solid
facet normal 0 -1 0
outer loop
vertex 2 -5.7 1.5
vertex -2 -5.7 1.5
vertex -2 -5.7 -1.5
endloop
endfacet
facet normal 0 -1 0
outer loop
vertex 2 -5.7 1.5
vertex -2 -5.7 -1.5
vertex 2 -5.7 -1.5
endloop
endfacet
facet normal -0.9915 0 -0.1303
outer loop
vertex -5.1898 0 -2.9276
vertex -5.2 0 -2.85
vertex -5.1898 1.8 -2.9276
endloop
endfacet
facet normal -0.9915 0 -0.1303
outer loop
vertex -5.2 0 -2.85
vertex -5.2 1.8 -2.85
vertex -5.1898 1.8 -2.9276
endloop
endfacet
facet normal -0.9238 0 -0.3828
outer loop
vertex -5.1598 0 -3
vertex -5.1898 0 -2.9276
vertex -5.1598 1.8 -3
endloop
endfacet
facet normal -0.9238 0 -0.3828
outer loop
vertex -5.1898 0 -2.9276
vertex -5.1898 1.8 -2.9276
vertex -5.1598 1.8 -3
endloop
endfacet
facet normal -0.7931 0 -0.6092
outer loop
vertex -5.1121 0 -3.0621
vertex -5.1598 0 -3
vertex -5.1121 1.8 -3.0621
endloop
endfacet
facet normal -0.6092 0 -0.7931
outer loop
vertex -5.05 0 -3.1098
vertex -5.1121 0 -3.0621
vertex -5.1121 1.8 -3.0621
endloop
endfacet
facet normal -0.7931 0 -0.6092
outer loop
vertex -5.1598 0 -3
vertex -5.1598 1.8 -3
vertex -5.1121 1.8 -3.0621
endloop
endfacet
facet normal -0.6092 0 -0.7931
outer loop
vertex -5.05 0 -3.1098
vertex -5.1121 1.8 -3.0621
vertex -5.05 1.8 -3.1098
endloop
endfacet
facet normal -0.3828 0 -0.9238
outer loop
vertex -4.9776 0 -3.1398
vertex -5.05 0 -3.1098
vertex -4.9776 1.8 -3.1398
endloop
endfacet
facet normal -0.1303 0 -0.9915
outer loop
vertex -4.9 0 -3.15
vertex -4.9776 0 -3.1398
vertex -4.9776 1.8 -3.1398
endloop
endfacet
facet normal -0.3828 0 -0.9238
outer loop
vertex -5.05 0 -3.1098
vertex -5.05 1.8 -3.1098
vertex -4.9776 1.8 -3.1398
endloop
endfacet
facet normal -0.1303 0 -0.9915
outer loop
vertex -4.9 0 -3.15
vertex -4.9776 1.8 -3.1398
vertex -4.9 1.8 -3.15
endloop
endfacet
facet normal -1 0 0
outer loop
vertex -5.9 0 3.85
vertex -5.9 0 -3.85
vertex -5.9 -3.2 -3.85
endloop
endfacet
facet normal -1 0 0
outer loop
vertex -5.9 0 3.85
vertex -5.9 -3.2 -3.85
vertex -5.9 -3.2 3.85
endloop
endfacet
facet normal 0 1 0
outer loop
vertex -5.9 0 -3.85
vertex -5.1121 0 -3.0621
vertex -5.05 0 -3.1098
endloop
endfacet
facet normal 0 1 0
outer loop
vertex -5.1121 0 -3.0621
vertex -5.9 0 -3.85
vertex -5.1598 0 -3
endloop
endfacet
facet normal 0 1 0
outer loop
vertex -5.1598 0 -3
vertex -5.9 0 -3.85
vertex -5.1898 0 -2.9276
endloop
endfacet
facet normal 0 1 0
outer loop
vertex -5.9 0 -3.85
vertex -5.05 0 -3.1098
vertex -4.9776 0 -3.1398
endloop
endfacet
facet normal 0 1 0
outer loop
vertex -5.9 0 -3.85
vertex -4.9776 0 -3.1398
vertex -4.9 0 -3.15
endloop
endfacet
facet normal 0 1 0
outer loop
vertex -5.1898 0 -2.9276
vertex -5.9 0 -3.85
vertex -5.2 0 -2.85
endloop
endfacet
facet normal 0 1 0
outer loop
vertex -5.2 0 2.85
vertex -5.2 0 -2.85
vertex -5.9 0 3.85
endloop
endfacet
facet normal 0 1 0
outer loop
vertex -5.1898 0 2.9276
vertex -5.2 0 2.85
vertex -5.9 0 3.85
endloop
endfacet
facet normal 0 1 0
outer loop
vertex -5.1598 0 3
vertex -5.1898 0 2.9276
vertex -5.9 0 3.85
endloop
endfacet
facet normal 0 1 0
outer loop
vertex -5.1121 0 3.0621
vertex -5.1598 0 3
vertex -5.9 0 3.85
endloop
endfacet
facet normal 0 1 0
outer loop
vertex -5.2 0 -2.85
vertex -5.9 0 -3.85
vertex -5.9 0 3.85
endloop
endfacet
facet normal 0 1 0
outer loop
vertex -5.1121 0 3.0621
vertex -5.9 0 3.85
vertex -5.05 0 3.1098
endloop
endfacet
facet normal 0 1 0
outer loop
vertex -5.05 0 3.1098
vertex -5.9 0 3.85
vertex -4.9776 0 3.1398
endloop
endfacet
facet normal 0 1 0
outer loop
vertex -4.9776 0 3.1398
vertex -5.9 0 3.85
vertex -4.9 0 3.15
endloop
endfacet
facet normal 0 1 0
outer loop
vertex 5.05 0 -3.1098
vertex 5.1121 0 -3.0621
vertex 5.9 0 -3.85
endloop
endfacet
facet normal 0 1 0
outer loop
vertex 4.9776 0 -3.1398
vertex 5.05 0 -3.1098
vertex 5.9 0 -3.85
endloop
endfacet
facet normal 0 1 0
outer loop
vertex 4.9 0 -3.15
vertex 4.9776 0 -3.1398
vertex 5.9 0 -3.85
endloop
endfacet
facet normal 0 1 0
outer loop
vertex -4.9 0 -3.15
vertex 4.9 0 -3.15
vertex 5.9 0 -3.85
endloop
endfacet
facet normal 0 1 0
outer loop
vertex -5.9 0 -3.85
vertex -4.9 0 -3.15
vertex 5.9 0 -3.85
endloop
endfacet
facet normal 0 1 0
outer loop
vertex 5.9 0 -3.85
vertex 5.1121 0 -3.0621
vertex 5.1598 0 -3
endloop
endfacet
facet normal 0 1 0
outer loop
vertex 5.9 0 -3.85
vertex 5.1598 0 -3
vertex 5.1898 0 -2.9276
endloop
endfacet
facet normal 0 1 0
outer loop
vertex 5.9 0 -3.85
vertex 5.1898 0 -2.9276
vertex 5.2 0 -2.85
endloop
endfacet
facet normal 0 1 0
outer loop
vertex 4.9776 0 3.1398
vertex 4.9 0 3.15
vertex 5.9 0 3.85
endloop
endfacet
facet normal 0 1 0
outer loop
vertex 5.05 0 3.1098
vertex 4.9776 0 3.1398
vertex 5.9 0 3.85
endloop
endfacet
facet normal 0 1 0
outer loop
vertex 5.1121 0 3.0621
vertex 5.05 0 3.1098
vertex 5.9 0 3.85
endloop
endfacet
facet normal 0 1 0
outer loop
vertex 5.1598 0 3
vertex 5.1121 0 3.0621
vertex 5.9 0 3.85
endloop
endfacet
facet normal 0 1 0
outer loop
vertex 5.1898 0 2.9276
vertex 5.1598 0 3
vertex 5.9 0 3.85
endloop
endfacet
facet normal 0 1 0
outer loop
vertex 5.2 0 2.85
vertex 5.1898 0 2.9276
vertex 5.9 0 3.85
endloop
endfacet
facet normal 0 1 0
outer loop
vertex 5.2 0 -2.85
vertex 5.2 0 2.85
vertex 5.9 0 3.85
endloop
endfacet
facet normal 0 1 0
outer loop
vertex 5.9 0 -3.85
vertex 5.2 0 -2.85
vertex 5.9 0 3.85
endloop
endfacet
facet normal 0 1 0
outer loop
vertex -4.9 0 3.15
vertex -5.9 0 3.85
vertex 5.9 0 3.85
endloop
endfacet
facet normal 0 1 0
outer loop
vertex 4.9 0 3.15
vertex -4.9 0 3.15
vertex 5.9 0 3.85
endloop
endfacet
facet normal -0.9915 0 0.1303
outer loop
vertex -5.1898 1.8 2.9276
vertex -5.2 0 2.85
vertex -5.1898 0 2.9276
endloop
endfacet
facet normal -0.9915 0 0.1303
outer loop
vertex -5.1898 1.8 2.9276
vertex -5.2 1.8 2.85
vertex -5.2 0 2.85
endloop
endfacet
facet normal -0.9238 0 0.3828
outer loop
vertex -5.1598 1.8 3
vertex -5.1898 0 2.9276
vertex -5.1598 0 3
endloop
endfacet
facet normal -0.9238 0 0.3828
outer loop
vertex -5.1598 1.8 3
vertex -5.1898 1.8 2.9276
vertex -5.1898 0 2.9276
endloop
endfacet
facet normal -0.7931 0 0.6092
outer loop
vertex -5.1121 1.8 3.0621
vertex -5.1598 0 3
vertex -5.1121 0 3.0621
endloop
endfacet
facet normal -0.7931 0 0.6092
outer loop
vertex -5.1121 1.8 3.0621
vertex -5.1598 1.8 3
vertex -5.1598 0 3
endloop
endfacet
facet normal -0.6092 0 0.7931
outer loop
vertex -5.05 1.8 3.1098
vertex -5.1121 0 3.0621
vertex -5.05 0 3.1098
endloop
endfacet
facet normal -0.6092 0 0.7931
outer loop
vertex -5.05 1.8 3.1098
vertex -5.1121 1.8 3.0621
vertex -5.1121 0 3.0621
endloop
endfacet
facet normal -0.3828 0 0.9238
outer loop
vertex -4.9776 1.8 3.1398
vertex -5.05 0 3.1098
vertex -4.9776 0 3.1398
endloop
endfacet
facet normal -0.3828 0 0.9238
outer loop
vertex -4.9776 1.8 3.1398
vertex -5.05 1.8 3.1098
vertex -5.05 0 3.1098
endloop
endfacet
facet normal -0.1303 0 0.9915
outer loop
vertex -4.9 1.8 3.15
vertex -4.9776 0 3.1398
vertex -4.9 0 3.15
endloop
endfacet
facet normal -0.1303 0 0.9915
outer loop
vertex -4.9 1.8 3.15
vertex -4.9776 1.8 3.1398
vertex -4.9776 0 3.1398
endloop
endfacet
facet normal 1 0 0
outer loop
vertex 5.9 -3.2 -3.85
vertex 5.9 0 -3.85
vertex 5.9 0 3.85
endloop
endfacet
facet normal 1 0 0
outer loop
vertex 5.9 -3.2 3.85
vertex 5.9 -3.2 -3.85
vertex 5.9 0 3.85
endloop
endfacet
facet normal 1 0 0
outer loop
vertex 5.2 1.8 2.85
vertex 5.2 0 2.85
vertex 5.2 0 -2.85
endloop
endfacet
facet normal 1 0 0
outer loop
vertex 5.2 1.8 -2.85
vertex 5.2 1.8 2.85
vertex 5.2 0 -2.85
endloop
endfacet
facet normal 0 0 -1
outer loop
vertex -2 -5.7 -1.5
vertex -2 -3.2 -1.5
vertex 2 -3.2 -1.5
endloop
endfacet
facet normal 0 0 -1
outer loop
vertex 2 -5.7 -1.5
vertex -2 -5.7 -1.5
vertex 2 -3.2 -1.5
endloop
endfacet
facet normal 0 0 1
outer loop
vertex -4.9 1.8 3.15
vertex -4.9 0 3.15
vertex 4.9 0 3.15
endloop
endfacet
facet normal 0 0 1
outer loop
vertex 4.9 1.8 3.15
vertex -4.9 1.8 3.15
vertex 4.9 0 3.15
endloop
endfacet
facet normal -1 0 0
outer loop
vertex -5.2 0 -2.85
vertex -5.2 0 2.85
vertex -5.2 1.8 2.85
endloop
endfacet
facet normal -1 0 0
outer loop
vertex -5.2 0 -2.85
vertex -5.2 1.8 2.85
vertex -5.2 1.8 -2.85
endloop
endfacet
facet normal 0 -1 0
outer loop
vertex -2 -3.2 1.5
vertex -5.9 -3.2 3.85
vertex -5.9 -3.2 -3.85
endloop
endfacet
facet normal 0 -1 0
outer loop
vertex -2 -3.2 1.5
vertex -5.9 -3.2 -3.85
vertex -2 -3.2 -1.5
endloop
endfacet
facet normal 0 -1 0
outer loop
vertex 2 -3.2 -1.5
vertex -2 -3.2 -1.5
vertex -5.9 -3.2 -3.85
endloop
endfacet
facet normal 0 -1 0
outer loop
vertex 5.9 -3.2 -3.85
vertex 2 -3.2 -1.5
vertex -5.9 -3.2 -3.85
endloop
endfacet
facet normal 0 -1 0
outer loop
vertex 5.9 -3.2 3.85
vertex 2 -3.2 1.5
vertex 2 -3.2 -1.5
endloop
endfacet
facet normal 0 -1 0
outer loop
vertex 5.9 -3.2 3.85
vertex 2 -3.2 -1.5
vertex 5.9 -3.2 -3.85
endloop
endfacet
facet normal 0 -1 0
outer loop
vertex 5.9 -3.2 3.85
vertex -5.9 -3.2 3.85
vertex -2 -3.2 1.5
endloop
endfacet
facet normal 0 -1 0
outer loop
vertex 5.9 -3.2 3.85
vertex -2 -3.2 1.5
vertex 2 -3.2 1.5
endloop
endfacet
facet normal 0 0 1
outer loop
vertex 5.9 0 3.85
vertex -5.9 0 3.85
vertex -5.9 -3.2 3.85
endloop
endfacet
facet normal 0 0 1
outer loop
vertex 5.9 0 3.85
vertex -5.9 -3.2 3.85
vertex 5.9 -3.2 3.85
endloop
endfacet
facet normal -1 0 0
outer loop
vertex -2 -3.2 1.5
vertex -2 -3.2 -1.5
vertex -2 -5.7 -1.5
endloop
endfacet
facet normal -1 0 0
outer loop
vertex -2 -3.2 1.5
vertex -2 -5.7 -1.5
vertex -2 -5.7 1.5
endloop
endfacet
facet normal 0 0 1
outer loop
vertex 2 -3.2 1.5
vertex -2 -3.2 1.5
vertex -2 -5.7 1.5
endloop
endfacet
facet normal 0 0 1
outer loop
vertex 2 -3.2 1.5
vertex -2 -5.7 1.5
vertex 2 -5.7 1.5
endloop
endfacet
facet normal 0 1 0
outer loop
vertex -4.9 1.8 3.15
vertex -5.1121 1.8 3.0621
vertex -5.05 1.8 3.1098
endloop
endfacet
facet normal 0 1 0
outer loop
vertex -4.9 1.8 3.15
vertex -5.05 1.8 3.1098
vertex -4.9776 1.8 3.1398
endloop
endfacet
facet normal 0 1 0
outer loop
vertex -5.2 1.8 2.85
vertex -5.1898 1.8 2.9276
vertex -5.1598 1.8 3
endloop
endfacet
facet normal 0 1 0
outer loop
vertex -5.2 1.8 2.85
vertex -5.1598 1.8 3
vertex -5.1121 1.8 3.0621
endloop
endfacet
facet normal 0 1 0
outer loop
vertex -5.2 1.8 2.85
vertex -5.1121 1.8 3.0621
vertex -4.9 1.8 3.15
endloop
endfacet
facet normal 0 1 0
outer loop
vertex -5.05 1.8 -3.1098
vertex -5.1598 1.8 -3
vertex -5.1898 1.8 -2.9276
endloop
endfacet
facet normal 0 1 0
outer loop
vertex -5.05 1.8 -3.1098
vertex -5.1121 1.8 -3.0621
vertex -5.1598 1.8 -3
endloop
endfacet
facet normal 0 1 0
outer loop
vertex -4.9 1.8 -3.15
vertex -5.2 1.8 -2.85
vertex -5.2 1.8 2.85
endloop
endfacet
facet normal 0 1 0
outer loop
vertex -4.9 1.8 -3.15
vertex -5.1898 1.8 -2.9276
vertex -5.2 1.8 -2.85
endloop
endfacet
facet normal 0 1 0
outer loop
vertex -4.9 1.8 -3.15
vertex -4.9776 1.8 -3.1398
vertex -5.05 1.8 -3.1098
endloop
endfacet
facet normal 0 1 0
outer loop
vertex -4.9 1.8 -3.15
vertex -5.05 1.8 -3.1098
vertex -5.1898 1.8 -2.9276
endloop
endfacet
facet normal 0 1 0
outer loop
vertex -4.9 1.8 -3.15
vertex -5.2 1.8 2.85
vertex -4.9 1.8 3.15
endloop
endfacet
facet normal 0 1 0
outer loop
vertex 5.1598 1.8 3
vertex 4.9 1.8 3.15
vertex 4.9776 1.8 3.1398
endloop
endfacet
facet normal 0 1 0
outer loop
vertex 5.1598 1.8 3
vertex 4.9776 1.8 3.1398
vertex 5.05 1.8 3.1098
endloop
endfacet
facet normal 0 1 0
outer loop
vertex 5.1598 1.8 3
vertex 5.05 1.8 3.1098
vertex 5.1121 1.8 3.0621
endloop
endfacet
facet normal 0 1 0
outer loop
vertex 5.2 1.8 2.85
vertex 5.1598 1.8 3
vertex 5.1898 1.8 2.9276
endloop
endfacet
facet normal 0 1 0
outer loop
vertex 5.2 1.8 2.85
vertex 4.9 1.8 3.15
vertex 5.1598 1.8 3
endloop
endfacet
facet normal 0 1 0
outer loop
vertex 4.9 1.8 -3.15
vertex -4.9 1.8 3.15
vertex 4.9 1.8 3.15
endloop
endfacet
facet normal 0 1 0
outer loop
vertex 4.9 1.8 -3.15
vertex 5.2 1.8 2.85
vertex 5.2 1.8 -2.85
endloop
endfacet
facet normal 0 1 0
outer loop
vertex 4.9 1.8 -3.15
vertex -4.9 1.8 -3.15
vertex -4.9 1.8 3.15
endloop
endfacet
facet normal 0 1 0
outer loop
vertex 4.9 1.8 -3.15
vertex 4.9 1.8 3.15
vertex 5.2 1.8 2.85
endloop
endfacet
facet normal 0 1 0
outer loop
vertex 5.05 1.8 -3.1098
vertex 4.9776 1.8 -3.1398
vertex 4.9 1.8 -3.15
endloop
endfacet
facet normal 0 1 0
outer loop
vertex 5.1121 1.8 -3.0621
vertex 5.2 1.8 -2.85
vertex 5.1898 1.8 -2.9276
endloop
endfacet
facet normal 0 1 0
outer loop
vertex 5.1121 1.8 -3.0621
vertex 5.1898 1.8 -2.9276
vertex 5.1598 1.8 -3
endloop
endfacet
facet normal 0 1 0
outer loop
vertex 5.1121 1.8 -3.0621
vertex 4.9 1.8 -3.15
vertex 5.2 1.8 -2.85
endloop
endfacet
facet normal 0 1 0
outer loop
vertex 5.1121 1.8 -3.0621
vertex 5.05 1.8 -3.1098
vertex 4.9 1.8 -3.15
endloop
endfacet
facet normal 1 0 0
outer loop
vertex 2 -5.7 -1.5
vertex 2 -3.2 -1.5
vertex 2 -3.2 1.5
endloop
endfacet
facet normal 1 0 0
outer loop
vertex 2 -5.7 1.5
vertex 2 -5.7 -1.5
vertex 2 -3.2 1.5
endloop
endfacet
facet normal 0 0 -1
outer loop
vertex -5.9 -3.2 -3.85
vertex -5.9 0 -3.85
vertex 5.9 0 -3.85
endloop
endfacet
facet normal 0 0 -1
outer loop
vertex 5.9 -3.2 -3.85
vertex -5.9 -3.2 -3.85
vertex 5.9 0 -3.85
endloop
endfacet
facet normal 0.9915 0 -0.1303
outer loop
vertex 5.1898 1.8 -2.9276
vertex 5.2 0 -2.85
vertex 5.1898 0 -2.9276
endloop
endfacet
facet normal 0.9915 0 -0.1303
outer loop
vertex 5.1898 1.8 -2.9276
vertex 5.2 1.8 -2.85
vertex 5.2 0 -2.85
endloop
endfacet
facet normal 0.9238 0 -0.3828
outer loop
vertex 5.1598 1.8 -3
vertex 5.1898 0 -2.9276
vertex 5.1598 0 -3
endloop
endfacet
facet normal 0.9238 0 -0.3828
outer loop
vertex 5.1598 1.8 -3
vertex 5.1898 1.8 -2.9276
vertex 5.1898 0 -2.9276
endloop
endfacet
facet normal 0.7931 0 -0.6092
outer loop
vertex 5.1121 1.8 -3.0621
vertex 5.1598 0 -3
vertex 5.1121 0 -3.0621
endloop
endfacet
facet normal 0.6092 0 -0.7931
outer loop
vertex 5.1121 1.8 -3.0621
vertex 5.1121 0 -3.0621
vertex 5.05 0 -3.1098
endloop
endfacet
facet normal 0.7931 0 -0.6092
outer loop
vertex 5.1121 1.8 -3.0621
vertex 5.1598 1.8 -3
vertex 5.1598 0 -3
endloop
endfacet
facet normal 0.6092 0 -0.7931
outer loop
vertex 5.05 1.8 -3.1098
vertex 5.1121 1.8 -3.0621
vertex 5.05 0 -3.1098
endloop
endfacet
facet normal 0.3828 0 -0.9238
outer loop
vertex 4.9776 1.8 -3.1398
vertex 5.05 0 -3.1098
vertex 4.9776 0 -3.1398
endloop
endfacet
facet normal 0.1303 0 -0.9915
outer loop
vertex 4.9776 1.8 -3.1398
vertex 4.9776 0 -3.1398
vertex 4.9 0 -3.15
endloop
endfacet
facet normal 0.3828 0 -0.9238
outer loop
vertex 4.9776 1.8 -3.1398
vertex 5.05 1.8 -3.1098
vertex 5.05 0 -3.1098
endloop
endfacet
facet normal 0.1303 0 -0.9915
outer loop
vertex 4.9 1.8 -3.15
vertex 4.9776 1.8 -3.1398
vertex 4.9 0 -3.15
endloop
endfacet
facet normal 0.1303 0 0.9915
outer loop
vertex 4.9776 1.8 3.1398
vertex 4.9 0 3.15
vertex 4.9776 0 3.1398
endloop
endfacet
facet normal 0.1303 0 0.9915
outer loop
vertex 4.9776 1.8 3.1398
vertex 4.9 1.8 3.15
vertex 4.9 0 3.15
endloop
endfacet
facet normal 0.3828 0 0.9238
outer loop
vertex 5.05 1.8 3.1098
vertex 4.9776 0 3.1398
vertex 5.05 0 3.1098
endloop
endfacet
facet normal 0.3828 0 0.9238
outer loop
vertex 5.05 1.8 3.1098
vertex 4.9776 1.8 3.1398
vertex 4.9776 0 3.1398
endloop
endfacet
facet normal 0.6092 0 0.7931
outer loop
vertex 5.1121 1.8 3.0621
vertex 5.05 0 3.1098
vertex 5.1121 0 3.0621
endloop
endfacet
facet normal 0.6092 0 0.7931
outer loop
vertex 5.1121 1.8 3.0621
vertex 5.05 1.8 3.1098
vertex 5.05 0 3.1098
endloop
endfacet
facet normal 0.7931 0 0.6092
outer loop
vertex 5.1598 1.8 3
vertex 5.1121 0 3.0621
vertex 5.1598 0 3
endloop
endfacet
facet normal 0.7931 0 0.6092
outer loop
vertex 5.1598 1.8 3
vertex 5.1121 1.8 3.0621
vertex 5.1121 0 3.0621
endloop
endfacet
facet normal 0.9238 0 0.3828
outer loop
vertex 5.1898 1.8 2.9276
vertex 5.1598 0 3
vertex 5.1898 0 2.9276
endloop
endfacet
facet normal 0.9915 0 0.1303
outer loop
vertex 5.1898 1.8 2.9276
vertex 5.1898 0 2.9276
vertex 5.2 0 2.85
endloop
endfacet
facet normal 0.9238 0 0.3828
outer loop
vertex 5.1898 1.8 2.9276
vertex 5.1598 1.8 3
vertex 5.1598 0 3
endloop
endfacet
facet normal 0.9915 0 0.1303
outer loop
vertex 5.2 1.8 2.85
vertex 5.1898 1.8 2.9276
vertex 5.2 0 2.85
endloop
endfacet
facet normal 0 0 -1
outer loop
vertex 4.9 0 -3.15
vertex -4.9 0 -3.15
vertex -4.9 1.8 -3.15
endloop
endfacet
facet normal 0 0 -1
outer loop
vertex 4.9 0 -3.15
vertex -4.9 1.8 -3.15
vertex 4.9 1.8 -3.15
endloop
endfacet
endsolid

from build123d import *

# Parameters (mm, degrees)
BODY_S_W      = 10.4
BODY_S_H      = 6.3
BODY_DEPTH    = 1.8
EDGE_FILLET_R = 0.3
BASE_S_W      = 11.8
BASE_S_H      = 7.7
BASE_DEPTH    = 3.2
PEG_S_W       = 4
PEG_S_H       = 3
PEG_DEPTH     = 2.5


with BuildPart() as part:
    # body-s → body (new body)
    with BuildSketch(Plane(origin=(0, 0, 0), x_dir=(1, 0, 0), z_dir=(0, 1, 0))):
        Rectangle(BODY_S_W, BODY_S_H)
    extrude(amount=BODY_DEPTH)

    # edge-fillet
    edge_fillet_edges = [part.edges().sort_by_distance(p)[0] for p in [
        (5.2, 0.9, 3.15),
        (-5.2, 0.9, 3.15),
        (-5.2, 0.9, -3.15),
        (5.2, 0.9, -3.15),
    ]]
    fillet(edge_fillet_edges, radius=EDGE_FILLET_R)

    # base-s → base (add)
    with BuildSketch(Plane.XZ):
        Rectangle(BASE_S_W, BASE_S_H)
    extrude(amount=BASE_DEPTH)

    # peg-s → peg (add)
    with BuildSketch(Plane.XZ.offset(3.2)):
        Rectangle(PEG_S_W, PEG_S_H)
    extrude(amount=PEG_DEPTH)


solid = part.part
